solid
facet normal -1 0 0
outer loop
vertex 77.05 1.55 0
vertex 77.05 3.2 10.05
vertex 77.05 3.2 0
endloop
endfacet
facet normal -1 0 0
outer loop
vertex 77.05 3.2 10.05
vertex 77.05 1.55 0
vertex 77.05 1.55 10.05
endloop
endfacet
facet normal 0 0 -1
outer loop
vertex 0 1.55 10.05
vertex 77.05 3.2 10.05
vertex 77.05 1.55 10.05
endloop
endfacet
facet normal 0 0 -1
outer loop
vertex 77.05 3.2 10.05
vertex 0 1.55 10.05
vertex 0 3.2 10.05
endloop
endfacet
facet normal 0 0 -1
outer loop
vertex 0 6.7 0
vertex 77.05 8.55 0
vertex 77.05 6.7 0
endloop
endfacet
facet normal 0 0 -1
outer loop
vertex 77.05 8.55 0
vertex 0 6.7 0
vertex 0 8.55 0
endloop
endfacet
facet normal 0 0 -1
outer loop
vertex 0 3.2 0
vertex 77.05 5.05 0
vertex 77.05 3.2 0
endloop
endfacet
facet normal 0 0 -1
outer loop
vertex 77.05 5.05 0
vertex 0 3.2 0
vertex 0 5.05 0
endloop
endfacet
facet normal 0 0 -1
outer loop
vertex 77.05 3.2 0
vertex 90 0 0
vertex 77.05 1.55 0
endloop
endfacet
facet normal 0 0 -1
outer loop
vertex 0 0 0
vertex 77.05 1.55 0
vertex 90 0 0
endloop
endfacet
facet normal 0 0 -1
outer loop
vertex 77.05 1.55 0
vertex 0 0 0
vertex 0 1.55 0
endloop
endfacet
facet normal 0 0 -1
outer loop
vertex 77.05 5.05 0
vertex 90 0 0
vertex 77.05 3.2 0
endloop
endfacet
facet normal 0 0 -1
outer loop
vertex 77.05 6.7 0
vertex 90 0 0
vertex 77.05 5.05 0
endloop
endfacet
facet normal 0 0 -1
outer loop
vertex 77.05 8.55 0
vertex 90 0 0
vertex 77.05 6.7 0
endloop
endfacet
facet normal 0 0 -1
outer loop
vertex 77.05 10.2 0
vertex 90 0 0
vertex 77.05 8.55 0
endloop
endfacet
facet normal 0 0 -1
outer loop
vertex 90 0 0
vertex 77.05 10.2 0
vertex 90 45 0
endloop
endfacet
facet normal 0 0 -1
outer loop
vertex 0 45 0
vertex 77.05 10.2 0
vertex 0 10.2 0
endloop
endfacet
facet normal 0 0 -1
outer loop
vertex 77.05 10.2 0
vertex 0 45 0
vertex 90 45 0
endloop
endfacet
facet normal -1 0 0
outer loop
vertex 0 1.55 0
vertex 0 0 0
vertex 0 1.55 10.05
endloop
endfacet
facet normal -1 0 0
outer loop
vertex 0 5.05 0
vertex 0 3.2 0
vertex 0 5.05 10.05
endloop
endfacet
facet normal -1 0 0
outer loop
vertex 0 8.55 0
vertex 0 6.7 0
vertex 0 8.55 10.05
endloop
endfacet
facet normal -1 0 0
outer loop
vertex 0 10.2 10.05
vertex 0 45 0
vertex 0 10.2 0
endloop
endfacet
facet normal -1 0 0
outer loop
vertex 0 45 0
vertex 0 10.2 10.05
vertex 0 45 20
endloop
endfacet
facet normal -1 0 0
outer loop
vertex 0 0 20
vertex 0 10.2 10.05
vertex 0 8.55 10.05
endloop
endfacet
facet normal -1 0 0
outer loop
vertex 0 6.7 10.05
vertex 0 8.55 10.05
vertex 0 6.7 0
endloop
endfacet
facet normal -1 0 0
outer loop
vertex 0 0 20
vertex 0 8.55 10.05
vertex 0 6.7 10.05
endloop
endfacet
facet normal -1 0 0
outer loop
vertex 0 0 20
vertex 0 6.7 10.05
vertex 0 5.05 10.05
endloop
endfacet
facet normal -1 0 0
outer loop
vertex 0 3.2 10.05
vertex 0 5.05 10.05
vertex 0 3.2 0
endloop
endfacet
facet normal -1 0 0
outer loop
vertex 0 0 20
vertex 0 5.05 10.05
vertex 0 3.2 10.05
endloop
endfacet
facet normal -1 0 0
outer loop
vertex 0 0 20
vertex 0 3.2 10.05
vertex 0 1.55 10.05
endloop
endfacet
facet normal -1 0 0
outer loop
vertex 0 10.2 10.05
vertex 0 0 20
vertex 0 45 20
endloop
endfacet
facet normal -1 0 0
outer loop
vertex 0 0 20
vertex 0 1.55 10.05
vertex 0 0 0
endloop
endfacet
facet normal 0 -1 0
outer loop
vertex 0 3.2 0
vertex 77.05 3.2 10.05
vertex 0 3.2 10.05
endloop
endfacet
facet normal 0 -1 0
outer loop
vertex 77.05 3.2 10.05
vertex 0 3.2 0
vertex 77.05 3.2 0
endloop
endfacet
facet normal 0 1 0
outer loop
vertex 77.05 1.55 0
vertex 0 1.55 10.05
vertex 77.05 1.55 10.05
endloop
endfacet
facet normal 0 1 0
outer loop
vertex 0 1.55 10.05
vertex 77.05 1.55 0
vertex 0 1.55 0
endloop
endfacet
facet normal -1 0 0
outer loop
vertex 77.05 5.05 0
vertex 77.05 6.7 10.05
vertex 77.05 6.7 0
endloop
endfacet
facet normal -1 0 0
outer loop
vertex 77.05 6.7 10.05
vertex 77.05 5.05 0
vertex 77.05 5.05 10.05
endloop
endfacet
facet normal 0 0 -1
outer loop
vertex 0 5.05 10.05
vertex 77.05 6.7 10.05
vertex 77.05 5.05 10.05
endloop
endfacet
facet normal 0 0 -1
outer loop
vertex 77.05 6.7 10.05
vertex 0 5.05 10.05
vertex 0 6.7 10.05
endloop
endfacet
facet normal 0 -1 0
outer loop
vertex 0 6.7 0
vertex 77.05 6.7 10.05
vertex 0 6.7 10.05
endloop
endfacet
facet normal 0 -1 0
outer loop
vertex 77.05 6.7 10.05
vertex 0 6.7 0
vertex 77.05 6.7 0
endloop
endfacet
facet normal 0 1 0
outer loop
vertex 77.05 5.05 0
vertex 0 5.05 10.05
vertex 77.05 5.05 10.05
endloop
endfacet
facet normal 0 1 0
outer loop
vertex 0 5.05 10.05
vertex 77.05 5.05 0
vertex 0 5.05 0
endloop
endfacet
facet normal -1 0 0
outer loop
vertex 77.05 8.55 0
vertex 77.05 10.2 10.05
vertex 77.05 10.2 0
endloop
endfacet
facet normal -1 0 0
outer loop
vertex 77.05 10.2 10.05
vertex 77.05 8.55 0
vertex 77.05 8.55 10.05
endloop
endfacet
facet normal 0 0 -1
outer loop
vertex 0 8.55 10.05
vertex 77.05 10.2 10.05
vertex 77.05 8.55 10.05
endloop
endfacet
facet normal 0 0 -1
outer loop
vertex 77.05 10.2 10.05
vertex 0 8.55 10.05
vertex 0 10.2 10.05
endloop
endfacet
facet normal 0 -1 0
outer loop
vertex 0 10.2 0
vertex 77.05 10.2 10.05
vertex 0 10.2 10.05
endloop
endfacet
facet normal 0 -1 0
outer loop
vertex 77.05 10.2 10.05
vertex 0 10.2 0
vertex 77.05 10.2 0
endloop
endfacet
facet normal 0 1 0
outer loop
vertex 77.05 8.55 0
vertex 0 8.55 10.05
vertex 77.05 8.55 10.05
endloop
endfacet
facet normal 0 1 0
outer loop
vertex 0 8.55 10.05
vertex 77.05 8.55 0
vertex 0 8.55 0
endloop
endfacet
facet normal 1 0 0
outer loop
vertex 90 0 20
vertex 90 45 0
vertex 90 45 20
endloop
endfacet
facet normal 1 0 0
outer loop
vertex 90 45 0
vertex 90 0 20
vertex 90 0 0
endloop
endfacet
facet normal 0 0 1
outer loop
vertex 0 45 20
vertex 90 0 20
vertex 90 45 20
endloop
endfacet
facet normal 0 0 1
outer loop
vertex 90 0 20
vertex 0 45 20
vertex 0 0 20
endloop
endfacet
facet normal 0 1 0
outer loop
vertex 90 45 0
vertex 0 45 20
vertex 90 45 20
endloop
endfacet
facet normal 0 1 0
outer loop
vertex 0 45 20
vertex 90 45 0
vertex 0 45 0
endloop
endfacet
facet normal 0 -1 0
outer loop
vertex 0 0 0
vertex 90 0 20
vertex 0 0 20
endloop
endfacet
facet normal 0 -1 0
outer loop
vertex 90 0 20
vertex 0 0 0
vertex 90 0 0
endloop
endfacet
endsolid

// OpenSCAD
$fn = 64;

// --- Dimensions ---
// Block dimensions (mm)
BLOCK_X = 90;
BLOCK_Y = 45;
BLOCK_Z = 20;

// Slot dimensions (mm)
SLOT_COUNT = 10;
SLOT_X = 77;
SLOT_Y = 1.6;
SLOT_DEPTH = 10;
SLOT_SPACING_Y = 3.5;

// --- Derived Dimensions ---
// Offset for cutting rule (Rule 5): extend 0.05mm past faces
CUT_OFFSET = 0.05;

// Calculate total width of slot array including gaps
// 10 slots + 9 gaps
SLOT_ARRAY_Y_WIDTH = (SLOT_COUNT * SLOT_Y) + ((SLOT_COUNT - 1) * SLOT_SPACING_Y);

// --- Main Part ---
difference() {
    // 1. Base Block
    // Centred on origin (X, Y), resting on Z=0
    translate([0, 0, 0])
        cube([BLOCK_X, BLOCK_Y, BLOCK_Z]);

    // 2. Slots
    // Centred on block in X and Y
    // Loop for 10 slots
    for (i = [0 : SLOT_COUNT - 1]) {
        // Calculate Y position for each slot
        // Center of array is 0.
        // Slot centers are spaced by SLOT_SPACING_Y
        // First slot center offset from array center:
        // Total array width / 2 - (Slot width / 2)
        // Center of array = 0
        // Center of Slot 0 = - (SLOT_ARRAY_Y_WIDTH / 2) + (SLOT_Y / 2)
        // Center of Slot i = Center of Slot 0 + i * SLOT_SPACING_Y
        
        slot_center_y = -(SLOT_ARRAY_Y_WIDTH / 2) + (SLOT_Y / 2) + (i * SLOT_SPACING_Y);
        
        // Apply cutting offset to ensure no coplanar faces (Rule 5)
        // Cut shape extends slightly past the intended void
        cut_x = SLOT_X + CUT_OFFSET;
        cut_y = SLOT_Y + CUT_OFFSET;
        cut_z = SLOT_DEPTH + CUT_OFFSET;
        
        translate([0, slot_center_y, 0])
            cube([cut_x, cut_y, cut_z]);
    }
}
